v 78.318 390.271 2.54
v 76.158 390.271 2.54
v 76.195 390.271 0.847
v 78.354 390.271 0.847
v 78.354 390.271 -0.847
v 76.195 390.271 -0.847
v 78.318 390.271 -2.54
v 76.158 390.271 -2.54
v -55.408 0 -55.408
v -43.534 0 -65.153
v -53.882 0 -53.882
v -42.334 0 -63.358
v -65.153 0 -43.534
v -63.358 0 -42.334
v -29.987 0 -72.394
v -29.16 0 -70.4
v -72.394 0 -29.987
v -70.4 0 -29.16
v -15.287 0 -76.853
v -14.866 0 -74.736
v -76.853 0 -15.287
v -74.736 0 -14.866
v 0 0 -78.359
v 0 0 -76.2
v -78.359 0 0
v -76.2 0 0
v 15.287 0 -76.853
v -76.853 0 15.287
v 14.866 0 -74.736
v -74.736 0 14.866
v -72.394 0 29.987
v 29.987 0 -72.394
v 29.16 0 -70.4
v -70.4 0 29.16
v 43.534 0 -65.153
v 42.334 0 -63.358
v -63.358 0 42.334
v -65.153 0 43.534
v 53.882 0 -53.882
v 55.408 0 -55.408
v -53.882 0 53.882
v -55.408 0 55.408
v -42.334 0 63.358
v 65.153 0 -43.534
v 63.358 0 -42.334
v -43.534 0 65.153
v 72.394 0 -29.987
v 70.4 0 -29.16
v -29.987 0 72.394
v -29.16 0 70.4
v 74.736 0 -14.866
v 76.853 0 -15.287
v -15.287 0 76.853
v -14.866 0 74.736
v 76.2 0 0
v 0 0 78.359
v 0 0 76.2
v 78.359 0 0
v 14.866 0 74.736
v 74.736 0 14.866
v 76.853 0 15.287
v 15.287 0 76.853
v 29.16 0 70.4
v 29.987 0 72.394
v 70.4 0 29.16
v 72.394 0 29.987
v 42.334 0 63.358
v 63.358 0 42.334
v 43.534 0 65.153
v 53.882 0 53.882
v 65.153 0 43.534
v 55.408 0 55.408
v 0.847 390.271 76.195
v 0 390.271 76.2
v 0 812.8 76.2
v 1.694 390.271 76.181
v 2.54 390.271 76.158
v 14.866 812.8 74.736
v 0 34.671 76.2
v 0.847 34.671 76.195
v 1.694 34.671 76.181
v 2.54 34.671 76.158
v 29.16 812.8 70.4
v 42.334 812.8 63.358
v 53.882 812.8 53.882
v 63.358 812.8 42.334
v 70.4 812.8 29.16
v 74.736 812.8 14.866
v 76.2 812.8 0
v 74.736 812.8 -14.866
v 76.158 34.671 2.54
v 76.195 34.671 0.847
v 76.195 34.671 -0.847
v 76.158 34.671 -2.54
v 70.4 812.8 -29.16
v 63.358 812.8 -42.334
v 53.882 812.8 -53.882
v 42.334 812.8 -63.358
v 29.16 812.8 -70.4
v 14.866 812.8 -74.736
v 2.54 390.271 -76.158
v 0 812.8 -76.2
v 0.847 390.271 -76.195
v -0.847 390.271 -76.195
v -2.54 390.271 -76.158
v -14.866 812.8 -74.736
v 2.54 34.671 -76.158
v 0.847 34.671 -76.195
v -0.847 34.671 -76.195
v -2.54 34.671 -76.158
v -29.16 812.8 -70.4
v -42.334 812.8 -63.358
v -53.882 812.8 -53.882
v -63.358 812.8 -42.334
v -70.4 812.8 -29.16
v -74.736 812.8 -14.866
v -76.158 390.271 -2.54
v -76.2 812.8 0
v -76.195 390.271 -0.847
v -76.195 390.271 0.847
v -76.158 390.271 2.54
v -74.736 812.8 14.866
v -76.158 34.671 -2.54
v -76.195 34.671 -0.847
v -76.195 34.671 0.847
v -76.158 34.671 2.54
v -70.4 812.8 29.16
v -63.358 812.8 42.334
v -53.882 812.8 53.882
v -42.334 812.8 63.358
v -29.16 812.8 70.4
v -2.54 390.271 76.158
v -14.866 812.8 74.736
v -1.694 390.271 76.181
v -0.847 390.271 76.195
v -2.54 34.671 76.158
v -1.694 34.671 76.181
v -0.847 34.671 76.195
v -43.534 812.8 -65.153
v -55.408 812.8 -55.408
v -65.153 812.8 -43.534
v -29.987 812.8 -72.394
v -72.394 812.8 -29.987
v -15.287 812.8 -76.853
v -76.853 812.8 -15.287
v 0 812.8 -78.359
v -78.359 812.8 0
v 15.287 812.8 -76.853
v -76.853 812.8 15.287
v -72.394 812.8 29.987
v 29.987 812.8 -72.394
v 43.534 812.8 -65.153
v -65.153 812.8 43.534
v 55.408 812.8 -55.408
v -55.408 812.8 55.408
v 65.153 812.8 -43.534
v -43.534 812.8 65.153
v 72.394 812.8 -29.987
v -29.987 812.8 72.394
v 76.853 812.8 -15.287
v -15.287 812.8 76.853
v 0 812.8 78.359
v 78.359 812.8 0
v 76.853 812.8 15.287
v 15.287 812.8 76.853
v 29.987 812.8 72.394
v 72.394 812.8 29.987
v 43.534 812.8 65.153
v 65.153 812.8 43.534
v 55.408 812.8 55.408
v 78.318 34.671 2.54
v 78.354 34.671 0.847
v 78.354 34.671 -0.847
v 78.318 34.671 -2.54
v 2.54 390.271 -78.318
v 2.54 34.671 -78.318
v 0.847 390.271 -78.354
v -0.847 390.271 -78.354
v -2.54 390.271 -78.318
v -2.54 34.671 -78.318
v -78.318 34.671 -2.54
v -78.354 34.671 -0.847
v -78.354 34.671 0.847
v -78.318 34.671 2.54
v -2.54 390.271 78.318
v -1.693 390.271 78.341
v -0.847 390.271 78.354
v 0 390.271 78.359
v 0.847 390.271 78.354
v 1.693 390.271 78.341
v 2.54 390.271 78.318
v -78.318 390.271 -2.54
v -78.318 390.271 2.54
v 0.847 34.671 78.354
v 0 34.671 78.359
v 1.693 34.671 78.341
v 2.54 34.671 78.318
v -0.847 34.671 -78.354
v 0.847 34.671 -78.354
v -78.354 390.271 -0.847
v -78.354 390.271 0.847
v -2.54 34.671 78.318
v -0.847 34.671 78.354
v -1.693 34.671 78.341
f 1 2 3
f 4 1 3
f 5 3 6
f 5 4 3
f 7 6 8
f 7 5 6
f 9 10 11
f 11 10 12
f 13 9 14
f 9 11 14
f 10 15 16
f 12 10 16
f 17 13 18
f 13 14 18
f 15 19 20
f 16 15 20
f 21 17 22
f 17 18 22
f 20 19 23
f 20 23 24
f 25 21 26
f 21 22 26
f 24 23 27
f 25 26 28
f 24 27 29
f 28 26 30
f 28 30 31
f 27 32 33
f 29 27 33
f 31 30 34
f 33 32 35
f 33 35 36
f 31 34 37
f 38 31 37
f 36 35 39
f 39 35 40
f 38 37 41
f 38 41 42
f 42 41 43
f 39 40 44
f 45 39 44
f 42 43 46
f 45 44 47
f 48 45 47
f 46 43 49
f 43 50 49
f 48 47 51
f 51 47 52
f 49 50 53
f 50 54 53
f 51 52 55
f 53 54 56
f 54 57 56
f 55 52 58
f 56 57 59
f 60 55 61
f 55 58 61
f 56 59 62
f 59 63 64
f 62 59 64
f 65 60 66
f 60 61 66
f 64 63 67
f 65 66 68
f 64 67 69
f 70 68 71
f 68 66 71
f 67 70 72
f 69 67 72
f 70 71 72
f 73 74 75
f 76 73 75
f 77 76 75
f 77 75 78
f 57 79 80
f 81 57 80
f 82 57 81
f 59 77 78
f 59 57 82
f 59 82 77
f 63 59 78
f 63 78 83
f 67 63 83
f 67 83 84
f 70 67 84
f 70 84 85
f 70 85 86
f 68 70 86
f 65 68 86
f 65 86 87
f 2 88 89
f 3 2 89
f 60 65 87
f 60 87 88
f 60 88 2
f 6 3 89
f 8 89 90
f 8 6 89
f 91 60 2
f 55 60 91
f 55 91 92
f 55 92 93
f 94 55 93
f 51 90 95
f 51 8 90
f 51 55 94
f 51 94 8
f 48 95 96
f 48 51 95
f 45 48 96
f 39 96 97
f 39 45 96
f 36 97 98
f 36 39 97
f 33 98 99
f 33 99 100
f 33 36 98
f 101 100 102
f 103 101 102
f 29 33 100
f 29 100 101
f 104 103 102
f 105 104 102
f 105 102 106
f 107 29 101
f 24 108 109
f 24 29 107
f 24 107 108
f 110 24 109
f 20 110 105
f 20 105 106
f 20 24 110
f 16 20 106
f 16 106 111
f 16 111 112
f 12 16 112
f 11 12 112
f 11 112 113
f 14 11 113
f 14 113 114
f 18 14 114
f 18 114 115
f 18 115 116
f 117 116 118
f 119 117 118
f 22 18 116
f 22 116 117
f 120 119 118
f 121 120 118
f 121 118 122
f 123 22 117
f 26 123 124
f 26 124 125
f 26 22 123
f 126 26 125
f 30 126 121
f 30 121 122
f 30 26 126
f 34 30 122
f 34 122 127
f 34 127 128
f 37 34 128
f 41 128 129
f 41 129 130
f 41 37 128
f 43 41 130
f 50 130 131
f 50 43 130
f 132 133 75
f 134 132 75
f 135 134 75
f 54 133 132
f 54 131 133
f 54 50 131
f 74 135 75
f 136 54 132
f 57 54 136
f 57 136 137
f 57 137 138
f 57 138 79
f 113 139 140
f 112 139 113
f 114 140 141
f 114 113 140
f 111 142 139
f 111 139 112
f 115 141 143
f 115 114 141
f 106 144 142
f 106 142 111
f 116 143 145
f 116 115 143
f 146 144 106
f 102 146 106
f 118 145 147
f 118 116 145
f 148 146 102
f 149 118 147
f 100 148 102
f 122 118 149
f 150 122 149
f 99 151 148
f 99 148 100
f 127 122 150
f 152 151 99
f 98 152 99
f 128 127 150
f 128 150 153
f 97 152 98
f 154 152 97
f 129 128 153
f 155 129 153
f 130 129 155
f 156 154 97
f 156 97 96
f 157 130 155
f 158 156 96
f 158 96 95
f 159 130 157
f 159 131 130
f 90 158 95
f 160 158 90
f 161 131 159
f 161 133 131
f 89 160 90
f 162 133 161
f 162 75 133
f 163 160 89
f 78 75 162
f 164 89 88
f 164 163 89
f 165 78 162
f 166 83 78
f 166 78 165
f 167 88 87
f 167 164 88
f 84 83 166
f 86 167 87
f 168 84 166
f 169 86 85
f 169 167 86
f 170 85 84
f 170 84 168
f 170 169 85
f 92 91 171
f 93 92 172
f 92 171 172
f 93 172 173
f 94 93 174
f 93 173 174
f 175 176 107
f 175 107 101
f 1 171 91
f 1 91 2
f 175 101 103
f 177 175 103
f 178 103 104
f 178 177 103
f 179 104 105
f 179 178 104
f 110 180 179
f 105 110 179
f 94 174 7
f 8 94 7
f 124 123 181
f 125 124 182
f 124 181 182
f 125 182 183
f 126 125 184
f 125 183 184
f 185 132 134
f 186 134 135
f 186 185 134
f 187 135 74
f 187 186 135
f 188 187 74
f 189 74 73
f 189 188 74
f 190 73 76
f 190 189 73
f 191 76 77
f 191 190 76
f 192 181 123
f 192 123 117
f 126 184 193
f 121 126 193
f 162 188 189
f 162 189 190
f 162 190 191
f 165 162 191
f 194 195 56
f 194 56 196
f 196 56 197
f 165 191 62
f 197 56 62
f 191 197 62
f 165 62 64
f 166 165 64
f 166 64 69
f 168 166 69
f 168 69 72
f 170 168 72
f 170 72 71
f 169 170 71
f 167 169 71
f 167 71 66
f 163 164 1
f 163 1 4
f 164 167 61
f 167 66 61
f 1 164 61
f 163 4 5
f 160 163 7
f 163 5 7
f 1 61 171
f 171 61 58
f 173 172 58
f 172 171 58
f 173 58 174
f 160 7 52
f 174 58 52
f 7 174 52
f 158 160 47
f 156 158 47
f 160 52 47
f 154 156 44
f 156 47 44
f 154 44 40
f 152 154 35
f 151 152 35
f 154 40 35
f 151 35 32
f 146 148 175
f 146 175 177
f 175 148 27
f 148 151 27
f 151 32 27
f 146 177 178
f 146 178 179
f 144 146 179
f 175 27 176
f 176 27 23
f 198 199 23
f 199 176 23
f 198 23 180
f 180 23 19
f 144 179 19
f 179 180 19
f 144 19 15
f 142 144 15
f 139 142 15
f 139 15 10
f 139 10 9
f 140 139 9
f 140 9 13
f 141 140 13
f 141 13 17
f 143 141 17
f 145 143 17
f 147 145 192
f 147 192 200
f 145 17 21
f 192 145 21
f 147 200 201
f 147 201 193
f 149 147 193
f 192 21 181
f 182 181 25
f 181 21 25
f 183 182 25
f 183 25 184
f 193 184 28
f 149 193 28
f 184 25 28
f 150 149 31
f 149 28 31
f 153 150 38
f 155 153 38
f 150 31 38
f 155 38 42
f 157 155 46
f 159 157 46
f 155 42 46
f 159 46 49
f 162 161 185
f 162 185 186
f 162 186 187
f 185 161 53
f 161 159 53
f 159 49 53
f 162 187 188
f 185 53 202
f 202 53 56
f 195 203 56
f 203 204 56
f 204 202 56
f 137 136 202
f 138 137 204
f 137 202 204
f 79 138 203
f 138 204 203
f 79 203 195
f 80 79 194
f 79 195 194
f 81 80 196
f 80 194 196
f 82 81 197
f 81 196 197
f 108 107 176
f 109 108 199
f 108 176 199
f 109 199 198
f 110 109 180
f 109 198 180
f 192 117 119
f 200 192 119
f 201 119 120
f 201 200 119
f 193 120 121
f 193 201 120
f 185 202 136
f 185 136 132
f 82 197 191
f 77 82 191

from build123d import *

# Parameters (mm, degrees)
SUSTAINER_TUBE_PROFILE_R   = 78.359
SUSTAINER_TUBE_PROFILE_R_2 = 76.2
SUSTAINER_TUBE_BODY_DEPTH  = 812.8
FIN_SLOT_CUT_REACH         = 833.471
FIN_SLOT_CUT_END_RADIUS    = 76.2
FIN_SLOT_PROFILE_W         = 2.54
FIN_SLOT_PROFILE_H         = 355.6
FIN_SLOT_PATTERN_COUNT     = 4


with BuildPart() as part:
    # Sustainer Tube Profile → Sustainer Tube Body (new body)
    with BuildSketch(Plane(origin=(0, 0, 0), x_dir=(1, 0, 0), z_dir=(0, 1, 0))):
        with Locations(Location((0, 0, 0), (0, 0, 270))):
            Circle(SUSTAINER_TUBE_PROFILE_R)
        with Locations(Location((0, 0, 0), (0, 0, 270))):
            Circle(SUSTAINER_TUBE_PROFILE_R_2, mode=Mode.SUBTRACT)
    extrude(amount=SUSTAINER_TUBE_BODY_DEPTH)

    # Fin Slot Cut: up to this cylinder (the profile starts outside it)
    fin_slot_cut_end = Plane(origin=(0, 212.471, 0), z_dir=(0, -1, 0)) * Cylinder(FIN_SLOT_CUT_END_RADIUS, 1820.342, mode=Mode.PRIVATE)
    # Fin Slot Profile → Fin Slot Cut (cut, up to the surface)
    with BuildSketch(Plane.XY.offset(78.359), mode=Mode.PRIVATE) as fin_slot_cut_sk1:
        with Locations((1.27, 212.471)):
            Rectangle(FIN_SLOT_PROFILE_W, FIN_SLOT_PROFILE_H)
    fin_slot_cut_tool1 = extrude(fin_slot_cut_sk1.sketch, amount=-FIN_SLOT_CUT_REACH, mode=Mode.PRIVATE) - fin_slot_cut_end
    # Fin Slot Profile → Fin Slot Cut (cut, up to the surface)
    with BuildSketch(Plane.XY.offset(78.359), mode=Mode.PRIVATE) as fin_slot_cut_sk2:
        with Locations((-1.27, 212.471)):
            Rectangle(FIN_SLOT_PROFILE_W, FIN_SLOT_PROFILE_H)
    fin_slot_cut_tool2 = extrude(fin_slot_cut_sk2.sketch, amount=-FIN_SLOT_CUT_REACH, mode=Mode.PRIVATE) - fin_slot_cut_end
    fin_slot_cut = fin_slot_cut_tool1.solids().sort_by_distance((1.27, 212.471, 78.359))[0] + fin_slot_cut_tool2.solids().sort_by_distance((-1.27, 212.471, 78.359))[0]
    add(fin_slot_cut, mode=Mode.SUBTRACT)

    # Fin Slot Pattern: Fin Slot Cut ×4 about axis
    fin_slot_pattern_axis = Axis((0, 0, 0), (0, 1, 0))
    for i in range(1, FIN_SLOT_PATTERN_COUNT):
        add(fin_slot_cut.rotate(fin_slot_pattern_axis, i * 360 / FIN_SLOT_PATTERN_COUNT), mode=Mode.SUBTRACT)


solid = part.part
